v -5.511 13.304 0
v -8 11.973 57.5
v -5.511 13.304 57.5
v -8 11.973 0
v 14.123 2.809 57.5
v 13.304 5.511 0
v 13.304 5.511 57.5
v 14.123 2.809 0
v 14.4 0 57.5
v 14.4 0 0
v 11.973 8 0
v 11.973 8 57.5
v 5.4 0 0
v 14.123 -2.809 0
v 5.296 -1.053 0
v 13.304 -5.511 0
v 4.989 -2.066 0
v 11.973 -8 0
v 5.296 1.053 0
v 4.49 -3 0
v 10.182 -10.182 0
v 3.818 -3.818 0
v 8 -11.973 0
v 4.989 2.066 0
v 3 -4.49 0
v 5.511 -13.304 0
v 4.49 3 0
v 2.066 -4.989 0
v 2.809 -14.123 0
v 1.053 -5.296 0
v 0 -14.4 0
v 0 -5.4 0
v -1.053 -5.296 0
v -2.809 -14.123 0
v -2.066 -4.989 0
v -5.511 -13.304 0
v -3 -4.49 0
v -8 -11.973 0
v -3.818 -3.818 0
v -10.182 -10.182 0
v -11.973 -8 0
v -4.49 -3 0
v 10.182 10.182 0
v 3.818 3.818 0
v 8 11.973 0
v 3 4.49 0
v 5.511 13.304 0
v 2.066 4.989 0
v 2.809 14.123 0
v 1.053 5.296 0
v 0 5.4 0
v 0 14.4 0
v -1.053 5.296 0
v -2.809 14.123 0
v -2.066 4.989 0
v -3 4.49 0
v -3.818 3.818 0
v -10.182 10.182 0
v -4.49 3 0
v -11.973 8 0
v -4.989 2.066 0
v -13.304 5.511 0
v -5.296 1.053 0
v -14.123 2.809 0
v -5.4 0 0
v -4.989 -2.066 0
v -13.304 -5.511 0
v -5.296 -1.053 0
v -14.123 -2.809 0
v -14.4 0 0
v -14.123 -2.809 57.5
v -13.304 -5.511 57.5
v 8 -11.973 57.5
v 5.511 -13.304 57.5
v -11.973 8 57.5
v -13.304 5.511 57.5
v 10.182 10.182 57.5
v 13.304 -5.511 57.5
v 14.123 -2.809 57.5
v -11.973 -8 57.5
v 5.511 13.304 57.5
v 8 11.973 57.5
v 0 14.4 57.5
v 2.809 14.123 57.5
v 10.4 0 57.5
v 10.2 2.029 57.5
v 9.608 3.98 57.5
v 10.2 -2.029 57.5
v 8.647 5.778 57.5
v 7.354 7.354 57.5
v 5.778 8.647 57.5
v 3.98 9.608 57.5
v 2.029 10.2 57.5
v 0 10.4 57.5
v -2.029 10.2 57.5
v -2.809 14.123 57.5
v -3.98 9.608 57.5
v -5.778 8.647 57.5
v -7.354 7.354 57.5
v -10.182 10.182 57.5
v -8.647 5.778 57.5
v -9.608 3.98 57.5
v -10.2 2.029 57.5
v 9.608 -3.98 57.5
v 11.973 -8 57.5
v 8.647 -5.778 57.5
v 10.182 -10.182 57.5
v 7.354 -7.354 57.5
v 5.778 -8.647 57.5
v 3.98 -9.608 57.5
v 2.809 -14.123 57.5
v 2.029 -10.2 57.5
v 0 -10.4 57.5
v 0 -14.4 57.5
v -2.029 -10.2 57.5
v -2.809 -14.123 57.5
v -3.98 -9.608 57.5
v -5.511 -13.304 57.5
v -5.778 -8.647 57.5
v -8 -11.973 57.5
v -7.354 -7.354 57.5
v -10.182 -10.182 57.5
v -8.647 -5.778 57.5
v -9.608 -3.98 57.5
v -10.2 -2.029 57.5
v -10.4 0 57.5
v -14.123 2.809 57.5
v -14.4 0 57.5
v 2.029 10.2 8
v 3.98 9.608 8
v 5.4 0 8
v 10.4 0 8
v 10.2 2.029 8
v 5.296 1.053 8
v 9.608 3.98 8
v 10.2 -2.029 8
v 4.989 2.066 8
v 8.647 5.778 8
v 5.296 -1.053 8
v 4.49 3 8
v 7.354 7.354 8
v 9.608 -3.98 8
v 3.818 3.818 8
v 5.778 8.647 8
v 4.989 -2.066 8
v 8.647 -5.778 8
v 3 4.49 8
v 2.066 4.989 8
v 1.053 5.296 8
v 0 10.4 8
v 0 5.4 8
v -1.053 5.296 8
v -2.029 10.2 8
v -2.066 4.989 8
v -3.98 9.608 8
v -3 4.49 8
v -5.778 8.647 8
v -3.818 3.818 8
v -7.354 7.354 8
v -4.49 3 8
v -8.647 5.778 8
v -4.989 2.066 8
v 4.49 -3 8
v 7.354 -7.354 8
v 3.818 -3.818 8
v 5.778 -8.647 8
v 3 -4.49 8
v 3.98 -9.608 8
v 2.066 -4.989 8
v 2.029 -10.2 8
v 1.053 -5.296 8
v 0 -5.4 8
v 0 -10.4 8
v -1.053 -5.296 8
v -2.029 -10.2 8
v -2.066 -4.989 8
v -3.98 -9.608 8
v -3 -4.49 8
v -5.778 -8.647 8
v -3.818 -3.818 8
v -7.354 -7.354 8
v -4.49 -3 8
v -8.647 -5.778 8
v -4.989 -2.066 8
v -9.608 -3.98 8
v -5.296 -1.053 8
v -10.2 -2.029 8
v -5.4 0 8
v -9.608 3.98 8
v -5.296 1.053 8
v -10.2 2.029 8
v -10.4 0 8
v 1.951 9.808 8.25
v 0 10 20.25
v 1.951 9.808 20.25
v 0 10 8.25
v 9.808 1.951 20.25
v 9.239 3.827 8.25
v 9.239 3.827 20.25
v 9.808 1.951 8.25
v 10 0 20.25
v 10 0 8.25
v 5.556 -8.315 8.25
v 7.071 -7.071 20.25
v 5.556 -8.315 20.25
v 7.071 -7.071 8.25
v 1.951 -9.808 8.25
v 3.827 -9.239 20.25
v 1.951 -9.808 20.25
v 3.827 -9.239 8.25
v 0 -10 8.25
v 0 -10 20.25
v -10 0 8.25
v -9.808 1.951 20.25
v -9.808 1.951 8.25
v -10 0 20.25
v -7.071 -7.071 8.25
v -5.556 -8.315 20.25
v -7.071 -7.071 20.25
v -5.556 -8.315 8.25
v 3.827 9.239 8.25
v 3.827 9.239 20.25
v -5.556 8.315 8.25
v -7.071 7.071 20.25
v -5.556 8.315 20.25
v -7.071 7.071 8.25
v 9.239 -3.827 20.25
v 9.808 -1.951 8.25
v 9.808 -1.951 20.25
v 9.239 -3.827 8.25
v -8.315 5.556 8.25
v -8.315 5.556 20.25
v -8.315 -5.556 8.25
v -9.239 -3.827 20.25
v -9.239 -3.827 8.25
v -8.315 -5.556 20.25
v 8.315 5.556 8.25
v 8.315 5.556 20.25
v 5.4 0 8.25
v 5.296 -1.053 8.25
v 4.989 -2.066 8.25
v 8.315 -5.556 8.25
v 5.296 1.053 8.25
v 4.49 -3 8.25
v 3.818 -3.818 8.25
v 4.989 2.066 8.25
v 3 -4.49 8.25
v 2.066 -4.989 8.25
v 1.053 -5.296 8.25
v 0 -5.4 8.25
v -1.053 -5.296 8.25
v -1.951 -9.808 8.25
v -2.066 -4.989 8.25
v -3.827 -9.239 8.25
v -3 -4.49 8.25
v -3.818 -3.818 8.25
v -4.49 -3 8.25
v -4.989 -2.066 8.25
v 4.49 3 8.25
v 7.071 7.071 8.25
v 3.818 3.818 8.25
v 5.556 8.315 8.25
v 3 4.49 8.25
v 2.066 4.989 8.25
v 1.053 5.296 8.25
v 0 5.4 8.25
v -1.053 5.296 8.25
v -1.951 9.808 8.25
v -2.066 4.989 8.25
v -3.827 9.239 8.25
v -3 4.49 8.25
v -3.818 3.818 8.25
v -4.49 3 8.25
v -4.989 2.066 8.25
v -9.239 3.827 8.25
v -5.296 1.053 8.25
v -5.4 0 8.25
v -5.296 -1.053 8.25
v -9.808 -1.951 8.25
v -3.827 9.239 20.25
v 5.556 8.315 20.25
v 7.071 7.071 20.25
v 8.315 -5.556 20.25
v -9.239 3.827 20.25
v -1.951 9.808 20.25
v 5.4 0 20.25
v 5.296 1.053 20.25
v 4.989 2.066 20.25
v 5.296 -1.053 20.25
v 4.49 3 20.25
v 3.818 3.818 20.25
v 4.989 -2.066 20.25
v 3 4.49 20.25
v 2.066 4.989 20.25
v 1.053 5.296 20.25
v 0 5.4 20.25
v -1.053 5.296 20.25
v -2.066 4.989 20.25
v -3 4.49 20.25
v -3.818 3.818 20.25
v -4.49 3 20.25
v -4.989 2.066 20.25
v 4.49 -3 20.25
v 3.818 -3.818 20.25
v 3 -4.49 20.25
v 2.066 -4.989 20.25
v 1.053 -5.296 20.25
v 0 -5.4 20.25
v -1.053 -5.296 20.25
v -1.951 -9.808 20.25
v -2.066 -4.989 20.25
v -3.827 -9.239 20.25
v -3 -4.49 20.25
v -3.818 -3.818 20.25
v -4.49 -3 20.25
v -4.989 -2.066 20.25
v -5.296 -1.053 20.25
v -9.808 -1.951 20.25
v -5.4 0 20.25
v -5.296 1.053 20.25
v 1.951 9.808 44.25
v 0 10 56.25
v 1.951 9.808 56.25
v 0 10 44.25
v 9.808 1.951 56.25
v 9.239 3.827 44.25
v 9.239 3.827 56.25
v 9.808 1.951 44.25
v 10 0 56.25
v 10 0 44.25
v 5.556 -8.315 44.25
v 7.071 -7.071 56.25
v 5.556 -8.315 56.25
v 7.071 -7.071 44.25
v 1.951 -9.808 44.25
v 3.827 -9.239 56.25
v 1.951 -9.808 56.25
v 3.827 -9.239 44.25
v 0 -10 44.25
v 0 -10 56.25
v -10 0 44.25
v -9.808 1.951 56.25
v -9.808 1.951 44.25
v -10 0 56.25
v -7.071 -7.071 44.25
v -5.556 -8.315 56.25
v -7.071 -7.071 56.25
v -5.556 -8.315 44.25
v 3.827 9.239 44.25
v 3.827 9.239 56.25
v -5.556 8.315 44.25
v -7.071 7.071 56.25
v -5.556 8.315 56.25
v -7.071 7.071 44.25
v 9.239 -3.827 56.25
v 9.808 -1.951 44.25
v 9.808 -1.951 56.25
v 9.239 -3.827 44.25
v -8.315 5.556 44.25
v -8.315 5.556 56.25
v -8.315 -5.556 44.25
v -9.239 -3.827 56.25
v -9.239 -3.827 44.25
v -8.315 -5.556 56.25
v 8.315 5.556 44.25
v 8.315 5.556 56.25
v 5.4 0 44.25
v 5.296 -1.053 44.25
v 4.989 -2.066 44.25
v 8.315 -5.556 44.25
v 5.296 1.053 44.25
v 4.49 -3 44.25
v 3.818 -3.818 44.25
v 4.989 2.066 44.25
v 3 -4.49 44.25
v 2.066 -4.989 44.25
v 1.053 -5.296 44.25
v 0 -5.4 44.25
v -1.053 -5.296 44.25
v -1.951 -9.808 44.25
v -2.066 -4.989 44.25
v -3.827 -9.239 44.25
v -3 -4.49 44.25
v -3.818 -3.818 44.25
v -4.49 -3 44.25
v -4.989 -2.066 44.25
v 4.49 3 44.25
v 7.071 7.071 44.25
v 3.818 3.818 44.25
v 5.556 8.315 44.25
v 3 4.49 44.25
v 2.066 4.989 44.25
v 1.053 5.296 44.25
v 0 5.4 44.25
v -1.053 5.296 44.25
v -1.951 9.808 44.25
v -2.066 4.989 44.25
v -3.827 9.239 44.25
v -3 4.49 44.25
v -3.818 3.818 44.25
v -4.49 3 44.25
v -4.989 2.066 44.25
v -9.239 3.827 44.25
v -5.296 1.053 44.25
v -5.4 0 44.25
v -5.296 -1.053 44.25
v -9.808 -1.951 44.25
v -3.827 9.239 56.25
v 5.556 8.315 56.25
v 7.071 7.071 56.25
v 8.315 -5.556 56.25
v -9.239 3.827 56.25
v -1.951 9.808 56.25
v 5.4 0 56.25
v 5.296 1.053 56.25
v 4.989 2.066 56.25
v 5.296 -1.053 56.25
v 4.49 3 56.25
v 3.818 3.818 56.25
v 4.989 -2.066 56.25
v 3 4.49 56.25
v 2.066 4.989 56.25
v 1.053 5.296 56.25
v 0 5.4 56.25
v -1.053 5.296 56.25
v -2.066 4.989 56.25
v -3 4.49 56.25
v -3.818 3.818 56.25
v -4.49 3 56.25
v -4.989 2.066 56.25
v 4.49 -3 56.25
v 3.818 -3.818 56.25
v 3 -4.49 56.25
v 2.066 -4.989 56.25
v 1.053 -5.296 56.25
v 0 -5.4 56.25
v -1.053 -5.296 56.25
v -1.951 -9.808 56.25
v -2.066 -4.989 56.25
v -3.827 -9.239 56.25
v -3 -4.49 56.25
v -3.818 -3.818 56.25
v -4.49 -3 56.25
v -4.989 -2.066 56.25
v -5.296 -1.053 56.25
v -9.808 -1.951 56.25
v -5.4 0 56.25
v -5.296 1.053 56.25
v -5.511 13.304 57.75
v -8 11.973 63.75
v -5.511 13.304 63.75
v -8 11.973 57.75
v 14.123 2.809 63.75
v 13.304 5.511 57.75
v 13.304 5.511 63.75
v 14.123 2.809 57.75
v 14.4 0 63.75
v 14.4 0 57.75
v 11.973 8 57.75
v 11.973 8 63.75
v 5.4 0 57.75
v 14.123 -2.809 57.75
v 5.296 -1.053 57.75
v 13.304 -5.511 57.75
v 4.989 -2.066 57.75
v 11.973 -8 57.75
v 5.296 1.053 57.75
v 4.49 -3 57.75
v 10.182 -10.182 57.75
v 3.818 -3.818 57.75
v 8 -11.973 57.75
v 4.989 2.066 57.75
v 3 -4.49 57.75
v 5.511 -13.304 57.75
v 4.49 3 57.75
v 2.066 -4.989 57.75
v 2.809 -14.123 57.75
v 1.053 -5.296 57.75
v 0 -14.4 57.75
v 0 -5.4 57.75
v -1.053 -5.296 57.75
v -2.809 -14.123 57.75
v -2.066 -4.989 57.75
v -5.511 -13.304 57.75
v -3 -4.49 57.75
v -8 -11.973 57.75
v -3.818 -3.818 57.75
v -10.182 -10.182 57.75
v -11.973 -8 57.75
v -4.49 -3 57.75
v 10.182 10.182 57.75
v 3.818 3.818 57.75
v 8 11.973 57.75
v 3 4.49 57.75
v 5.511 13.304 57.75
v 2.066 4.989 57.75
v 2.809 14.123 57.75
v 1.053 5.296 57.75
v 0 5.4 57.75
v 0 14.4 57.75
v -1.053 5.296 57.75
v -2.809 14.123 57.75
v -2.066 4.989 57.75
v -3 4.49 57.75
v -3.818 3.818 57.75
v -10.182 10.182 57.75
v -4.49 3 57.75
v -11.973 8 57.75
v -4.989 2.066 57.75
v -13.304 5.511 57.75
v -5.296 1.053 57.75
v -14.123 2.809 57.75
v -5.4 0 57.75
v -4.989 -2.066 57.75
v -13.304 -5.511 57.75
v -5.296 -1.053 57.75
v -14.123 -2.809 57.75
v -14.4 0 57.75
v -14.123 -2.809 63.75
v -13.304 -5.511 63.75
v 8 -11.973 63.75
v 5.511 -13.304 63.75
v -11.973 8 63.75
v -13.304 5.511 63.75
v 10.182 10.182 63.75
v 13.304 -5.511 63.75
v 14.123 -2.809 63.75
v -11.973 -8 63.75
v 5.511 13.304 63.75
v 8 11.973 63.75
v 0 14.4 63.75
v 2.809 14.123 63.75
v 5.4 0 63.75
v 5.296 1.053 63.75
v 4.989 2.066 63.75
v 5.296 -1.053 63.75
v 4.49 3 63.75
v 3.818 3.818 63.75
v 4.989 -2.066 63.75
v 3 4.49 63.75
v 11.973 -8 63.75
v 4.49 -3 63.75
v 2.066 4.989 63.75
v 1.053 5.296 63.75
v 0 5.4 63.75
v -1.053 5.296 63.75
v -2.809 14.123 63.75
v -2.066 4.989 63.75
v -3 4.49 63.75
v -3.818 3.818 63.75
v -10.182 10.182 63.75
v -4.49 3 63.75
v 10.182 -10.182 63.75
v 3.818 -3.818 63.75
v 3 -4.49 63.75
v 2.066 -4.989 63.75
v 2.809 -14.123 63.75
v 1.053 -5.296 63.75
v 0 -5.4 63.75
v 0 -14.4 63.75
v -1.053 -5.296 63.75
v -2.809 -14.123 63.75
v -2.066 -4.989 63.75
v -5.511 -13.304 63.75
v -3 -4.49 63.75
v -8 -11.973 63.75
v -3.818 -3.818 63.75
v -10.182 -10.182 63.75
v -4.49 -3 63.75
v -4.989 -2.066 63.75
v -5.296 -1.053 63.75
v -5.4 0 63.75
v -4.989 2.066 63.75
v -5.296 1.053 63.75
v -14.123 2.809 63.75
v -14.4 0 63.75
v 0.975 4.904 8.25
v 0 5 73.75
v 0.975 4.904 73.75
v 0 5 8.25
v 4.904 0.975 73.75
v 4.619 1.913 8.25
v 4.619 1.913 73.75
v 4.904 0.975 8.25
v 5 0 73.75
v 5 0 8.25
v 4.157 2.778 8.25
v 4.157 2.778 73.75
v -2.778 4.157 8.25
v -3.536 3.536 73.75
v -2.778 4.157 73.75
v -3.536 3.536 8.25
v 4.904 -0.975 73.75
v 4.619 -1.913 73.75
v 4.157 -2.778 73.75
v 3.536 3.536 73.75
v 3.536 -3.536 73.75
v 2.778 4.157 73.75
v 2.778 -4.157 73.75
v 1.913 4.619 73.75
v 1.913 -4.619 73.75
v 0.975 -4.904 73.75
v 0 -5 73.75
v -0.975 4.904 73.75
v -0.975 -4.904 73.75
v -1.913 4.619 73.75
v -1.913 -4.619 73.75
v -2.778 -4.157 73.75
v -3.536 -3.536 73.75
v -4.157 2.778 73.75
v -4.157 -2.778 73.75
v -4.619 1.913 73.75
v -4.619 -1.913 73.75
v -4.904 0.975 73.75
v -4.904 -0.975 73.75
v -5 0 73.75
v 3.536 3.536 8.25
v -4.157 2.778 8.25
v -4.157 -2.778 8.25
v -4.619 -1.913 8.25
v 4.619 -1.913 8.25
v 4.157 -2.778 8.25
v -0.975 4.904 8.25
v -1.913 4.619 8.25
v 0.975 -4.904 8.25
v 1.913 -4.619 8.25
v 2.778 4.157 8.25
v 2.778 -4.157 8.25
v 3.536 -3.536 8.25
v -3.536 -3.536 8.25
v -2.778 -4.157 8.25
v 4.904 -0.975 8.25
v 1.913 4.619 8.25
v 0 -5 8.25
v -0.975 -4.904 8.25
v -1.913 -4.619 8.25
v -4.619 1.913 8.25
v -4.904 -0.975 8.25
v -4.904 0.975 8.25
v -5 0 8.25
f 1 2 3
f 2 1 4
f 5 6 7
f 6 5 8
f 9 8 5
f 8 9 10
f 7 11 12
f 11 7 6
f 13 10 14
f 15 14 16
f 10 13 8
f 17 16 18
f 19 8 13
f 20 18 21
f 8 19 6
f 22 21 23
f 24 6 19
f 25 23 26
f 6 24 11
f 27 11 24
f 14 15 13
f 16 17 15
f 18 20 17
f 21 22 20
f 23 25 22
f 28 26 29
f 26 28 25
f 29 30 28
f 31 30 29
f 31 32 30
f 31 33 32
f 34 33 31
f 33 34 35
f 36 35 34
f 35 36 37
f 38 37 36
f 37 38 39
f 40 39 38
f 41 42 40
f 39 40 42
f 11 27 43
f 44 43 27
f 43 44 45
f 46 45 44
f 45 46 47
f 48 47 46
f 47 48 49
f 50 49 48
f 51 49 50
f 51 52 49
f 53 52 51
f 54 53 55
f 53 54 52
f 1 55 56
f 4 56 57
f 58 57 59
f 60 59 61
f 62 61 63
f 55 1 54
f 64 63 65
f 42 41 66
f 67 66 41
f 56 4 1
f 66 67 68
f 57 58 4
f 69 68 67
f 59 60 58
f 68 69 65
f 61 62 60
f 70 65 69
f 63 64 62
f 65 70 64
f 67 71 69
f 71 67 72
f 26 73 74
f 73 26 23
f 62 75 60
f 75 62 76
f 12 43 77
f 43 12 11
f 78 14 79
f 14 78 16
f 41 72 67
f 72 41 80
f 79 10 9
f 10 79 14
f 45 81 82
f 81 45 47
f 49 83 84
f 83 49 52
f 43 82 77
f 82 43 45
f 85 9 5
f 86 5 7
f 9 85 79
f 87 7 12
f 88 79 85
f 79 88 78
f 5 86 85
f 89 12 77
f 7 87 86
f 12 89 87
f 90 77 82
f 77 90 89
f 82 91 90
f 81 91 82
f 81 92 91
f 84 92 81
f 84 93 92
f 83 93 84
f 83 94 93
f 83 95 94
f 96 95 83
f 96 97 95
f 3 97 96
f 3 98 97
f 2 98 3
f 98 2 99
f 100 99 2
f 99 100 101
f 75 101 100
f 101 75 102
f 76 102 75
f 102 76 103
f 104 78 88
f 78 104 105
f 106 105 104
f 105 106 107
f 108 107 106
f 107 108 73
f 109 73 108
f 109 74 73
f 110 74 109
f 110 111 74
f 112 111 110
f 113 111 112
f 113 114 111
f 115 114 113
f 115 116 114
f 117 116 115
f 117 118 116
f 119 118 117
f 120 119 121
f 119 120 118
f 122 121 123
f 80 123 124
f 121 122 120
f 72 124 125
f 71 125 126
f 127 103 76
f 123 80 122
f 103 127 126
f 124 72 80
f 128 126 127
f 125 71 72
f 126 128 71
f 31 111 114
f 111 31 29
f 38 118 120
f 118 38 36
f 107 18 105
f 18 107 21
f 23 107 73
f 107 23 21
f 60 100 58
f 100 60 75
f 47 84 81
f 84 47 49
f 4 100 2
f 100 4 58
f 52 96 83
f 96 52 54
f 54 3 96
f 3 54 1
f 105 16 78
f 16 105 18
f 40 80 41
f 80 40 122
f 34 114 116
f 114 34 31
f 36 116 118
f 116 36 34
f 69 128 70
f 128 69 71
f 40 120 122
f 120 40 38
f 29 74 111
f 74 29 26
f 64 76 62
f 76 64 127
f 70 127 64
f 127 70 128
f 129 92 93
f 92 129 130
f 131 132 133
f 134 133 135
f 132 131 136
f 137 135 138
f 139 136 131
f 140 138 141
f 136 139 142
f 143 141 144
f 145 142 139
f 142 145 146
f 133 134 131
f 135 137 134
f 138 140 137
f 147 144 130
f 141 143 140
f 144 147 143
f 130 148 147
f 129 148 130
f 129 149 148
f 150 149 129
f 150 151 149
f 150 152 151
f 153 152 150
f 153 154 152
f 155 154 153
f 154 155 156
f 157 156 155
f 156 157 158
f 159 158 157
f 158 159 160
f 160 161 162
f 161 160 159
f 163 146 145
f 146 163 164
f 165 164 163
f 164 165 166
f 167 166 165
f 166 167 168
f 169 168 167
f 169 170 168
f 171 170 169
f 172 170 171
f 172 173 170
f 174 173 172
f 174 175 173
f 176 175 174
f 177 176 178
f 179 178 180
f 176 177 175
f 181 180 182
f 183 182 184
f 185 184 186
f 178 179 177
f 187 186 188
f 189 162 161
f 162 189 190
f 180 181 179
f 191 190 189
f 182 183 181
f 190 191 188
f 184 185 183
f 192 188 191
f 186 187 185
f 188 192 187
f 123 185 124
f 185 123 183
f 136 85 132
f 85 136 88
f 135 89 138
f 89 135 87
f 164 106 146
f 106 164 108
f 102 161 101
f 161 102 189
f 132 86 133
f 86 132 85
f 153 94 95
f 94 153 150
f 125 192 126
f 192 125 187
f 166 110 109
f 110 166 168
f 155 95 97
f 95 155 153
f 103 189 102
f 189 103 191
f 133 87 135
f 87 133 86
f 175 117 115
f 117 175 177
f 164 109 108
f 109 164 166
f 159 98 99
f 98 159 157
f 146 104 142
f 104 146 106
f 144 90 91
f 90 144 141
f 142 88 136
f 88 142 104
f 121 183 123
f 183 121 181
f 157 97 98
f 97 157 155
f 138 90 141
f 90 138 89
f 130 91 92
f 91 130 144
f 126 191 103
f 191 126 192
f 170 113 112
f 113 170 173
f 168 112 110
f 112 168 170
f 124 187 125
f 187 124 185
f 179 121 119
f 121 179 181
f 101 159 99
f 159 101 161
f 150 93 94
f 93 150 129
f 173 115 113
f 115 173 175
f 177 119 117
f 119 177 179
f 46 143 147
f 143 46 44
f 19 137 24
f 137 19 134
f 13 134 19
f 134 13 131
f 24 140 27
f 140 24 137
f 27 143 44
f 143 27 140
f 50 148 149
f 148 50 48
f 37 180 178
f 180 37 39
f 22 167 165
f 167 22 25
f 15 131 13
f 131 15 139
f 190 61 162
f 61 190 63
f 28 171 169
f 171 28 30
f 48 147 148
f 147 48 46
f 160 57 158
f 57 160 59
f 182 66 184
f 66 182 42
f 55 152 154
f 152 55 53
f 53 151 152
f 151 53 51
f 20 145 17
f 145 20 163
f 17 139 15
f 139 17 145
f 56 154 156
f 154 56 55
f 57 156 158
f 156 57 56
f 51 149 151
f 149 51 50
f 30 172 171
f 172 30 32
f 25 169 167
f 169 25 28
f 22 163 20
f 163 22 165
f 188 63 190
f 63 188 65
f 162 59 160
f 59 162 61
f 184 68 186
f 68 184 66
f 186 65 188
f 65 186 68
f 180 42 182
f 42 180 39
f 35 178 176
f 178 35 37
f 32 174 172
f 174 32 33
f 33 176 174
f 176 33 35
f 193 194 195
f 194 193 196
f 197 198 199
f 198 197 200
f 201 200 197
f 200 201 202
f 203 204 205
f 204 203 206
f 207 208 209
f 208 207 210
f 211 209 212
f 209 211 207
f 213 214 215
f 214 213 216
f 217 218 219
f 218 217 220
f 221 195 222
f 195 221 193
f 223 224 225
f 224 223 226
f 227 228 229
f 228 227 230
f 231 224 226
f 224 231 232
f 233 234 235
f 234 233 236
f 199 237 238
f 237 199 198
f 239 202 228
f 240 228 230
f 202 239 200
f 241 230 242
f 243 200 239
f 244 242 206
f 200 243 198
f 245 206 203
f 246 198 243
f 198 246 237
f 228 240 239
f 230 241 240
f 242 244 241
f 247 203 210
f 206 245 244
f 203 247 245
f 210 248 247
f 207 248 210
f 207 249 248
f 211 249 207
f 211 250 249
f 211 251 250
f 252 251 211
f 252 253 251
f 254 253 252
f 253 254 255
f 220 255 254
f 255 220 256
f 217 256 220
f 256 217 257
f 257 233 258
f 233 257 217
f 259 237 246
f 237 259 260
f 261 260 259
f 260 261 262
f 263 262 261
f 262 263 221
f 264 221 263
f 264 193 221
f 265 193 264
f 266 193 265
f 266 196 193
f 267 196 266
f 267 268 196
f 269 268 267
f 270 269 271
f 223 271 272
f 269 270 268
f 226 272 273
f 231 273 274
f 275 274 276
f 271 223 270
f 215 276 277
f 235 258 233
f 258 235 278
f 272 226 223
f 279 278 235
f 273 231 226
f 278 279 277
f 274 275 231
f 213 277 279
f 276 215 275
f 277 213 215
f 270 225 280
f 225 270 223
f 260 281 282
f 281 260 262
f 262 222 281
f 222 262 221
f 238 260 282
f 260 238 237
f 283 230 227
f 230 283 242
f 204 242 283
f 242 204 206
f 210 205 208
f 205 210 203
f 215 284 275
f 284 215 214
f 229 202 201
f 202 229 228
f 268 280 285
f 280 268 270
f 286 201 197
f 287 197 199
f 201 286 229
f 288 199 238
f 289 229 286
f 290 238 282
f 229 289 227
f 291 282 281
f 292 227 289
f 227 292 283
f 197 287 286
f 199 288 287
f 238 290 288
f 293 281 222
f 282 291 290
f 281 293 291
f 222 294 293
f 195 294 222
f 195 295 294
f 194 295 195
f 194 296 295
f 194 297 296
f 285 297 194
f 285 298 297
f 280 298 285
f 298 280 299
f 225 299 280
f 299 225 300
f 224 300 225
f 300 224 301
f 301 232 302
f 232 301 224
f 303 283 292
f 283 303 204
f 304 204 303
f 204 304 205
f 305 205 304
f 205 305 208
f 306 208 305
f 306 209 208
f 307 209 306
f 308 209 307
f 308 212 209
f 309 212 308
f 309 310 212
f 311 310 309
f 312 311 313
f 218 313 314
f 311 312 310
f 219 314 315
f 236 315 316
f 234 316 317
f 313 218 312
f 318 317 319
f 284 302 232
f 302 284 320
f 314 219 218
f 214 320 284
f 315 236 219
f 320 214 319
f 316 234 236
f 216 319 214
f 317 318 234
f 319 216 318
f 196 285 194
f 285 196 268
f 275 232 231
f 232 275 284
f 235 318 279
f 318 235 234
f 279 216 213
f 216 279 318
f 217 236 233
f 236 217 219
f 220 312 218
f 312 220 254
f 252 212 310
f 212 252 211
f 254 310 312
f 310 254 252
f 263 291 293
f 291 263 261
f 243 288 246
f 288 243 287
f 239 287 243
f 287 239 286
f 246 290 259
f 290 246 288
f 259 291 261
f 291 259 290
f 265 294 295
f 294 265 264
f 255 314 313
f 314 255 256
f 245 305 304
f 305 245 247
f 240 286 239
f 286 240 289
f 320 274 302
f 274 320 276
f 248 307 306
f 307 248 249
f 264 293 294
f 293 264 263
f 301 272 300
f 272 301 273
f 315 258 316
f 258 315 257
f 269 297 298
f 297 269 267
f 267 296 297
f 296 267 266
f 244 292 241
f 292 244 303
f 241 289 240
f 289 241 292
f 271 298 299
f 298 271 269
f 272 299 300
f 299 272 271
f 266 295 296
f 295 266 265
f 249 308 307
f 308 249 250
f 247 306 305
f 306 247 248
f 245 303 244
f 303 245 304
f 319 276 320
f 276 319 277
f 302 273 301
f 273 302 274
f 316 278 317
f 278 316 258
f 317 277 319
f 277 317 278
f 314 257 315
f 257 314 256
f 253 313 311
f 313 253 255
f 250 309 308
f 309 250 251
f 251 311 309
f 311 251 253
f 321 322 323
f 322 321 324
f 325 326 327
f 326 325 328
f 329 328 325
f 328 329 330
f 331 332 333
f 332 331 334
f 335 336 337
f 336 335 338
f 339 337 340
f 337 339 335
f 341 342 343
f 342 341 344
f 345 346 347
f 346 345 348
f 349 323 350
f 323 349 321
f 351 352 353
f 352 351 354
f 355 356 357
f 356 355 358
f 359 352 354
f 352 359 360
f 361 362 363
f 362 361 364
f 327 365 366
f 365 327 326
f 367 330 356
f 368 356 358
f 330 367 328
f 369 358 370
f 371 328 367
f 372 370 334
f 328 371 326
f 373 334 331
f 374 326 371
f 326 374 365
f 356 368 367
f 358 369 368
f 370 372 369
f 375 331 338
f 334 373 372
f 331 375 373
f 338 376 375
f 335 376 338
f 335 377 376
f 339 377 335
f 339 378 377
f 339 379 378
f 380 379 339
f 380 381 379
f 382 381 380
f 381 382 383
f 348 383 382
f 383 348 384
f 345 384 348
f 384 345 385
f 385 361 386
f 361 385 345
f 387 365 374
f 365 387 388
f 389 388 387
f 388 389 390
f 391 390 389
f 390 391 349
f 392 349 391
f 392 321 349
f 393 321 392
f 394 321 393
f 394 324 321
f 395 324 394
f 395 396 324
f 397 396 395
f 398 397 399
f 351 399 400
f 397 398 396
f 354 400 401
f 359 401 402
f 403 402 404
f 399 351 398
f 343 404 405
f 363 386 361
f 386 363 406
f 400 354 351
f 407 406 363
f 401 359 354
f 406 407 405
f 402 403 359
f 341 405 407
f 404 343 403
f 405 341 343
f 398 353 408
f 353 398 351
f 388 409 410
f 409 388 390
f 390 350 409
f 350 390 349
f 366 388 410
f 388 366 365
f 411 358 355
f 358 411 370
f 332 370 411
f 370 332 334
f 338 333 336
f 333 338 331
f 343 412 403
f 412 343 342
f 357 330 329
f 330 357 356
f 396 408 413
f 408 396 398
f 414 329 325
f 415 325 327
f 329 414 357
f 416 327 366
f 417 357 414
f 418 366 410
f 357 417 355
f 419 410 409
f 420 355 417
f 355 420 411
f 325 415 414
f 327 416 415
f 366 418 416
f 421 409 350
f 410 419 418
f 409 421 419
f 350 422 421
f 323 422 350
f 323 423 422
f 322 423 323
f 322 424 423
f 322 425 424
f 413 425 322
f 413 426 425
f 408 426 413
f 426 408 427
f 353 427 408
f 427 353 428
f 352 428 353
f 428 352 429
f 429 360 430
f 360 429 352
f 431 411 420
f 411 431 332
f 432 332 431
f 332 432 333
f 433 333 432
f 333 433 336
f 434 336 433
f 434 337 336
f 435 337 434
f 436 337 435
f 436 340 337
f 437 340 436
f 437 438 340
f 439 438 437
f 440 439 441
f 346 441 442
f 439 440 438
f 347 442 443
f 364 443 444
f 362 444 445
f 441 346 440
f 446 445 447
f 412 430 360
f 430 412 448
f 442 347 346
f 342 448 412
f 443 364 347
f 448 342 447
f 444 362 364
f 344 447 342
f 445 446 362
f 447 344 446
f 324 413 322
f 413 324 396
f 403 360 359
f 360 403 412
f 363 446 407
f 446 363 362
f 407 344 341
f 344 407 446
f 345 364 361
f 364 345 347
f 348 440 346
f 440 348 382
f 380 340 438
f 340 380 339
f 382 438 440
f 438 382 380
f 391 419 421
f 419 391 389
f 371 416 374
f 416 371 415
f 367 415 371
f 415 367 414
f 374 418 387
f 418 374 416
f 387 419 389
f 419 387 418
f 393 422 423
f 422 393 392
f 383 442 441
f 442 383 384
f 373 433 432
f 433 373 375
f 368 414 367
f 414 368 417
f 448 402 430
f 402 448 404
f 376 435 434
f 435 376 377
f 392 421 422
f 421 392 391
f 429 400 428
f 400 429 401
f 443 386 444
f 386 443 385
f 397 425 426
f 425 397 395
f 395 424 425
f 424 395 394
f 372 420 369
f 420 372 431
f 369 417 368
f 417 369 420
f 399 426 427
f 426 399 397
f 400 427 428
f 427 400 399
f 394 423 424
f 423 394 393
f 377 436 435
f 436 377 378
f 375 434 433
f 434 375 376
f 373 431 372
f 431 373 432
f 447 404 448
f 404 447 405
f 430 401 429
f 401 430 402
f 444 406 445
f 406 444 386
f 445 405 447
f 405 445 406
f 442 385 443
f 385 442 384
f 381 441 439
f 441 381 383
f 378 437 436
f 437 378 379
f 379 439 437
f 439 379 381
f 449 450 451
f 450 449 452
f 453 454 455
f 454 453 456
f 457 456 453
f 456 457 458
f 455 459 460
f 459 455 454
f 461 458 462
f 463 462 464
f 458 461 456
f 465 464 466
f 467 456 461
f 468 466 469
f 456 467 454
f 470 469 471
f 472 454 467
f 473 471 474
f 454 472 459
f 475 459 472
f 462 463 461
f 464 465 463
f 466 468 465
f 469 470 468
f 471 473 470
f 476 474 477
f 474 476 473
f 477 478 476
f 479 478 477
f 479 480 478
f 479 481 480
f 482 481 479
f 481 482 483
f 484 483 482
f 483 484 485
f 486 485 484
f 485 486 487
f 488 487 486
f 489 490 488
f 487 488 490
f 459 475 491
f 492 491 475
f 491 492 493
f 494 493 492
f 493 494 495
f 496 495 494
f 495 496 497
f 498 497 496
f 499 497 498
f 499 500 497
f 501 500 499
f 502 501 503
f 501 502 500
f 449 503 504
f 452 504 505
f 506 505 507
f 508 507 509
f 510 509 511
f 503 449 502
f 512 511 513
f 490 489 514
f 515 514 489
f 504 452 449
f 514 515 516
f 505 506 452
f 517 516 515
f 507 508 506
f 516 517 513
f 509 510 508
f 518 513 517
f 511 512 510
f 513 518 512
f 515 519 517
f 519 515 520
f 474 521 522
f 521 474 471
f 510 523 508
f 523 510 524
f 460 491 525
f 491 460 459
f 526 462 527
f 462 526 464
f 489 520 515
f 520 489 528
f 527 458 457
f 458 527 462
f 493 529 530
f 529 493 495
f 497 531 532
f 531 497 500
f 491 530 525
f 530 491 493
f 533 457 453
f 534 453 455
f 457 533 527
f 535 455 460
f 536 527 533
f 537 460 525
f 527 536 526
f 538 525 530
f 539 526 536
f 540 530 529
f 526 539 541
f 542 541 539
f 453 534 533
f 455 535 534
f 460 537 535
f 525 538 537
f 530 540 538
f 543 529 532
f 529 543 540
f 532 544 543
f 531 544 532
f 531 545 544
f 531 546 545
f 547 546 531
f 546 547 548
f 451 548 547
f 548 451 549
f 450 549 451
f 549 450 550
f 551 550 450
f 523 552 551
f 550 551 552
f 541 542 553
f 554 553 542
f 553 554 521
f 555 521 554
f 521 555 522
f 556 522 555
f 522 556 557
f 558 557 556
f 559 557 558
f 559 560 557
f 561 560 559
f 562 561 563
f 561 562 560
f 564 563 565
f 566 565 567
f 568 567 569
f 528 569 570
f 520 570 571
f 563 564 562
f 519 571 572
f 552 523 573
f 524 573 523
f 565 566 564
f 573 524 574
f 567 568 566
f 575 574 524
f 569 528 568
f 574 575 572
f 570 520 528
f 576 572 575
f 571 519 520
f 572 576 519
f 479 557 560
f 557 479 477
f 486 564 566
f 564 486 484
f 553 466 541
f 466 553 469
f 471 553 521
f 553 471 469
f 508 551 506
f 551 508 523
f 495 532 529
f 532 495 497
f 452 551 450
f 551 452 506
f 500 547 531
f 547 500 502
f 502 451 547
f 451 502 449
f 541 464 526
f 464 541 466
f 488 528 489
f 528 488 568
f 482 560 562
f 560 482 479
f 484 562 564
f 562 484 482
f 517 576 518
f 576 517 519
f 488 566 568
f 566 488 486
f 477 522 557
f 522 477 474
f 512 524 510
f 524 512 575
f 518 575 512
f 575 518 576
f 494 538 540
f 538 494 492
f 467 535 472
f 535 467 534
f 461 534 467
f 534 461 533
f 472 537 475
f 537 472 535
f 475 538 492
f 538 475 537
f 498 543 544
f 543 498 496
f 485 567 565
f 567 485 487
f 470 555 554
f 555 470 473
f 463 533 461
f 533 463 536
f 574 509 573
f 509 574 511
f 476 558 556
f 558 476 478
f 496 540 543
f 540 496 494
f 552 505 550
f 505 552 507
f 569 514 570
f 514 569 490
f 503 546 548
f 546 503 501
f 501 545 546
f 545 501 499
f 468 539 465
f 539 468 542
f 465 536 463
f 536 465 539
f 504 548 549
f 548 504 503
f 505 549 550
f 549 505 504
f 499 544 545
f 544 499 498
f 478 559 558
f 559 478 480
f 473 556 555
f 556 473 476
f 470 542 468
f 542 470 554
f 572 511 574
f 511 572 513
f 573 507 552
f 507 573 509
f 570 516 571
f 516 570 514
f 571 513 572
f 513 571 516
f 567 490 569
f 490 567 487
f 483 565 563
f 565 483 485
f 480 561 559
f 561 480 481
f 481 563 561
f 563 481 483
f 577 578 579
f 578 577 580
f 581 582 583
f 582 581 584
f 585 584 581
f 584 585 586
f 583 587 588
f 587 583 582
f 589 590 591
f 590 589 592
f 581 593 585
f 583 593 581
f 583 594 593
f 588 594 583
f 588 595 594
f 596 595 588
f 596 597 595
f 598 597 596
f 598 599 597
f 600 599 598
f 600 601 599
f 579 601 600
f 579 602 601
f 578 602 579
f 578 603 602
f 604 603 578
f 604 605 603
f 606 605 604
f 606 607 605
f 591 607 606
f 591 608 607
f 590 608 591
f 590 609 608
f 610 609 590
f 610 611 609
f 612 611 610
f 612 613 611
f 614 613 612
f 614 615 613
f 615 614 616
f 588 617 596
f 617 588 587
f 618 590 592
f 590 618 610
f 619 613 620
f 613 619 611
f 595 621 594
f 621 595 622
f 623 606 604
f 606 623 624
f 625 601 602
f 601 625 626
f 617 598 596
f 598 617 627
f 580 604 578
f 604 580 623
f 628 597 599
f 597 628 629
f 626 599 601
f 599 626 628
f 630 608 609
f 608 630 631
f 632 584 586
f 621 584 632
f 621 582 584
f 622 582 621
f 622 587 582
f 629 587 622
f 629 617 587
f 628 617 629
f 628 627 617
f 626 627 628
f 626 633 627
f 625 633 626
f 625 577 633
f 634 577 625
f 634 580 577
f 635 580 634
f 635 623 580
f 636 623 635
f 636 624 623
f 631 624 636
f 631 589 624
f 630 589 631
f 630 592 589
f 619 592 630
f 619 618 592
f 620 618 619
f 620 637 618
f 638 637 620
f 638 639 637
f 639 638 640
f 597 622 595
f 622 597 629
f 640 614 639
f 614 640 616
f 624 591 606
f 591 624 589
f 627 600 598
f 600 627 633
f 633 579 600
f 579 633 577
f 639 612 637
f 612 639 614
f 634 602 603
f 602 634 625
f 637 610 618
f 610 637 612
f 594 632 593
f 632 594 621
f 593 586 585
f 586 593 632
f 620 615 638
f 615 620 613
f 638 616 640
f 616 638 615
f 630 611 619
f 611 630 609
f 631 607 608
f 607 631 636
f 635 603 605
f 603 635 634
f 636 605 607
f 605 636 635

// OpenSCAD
$fn = 32;

// ------------------------------------------------------------------------
// Shaft station: cup d28.8 x 57.5 mm, shaft d10
// Every part is its own module, assembly() places every instance.
// ------------------------------------------------------------------------

// --- part 1 ---
module housing_cup() {
  difference() {
    cylinder(h = 57.5, d = 28.8);
    translate([0, 0, 8]) cylinder(h = 50.5, d = 20.8);
    translate([0, 0, -1]) cylinder(h = 10, d = 10.8);
  }
}

// --- part 2 ---
module bearing_lower() {
  difference() {
      translate([0, 0, 0]) cylinder(h = 12, d = 20);
      translate([0, 0, -1]) cylinder(h = 14, d = 10.8);
    }
}

// --- part 3 ---
module bearing_upper() {
  difference() {
      translate([0, 0, 0]) cylinder(h = 12, d = 20);
      translate([0, 0, -1]) cylinder(h = 14, d = 10.8);
    }
}

// --- part 4 ---
module station_shaft() {
  translate([0, 0, -32.75]) cylinder(h = 65.5, d = 10);
}

// --- part 5 ---
module station_cover() {
  difference() {
    cylinder(h = 6, d = 28.8);
    translate([0, 0, -1]) cylinder(h = 8, d = 10.8);
  }
}

// --- assembly ---
module assembly() {
  color([0.80, 0.24, 0.20]) translate([0, 0, 0]) rotate([0, 0, 0]) housing_cup();
  color([0.20, 0.45, 0.75]) translate([0, 0, 8.25]) rotate([0, 0, 0]) bearing_lower();
  color([0.25, 0.62, 0.32]) translate([0, 0, 44.25]) rotate([0, 0, 0]) bearing_upper();
  color([0.92, 0.70, 0.18]) translate([0, 0, 41]) rotate([0, 0, 0]) station_shaft();
  color([0.58, 0.35, 0.70]) translate([0, 0, 57.75]) rotate([0, 0, 0]) station_cover();
}

assembly();
